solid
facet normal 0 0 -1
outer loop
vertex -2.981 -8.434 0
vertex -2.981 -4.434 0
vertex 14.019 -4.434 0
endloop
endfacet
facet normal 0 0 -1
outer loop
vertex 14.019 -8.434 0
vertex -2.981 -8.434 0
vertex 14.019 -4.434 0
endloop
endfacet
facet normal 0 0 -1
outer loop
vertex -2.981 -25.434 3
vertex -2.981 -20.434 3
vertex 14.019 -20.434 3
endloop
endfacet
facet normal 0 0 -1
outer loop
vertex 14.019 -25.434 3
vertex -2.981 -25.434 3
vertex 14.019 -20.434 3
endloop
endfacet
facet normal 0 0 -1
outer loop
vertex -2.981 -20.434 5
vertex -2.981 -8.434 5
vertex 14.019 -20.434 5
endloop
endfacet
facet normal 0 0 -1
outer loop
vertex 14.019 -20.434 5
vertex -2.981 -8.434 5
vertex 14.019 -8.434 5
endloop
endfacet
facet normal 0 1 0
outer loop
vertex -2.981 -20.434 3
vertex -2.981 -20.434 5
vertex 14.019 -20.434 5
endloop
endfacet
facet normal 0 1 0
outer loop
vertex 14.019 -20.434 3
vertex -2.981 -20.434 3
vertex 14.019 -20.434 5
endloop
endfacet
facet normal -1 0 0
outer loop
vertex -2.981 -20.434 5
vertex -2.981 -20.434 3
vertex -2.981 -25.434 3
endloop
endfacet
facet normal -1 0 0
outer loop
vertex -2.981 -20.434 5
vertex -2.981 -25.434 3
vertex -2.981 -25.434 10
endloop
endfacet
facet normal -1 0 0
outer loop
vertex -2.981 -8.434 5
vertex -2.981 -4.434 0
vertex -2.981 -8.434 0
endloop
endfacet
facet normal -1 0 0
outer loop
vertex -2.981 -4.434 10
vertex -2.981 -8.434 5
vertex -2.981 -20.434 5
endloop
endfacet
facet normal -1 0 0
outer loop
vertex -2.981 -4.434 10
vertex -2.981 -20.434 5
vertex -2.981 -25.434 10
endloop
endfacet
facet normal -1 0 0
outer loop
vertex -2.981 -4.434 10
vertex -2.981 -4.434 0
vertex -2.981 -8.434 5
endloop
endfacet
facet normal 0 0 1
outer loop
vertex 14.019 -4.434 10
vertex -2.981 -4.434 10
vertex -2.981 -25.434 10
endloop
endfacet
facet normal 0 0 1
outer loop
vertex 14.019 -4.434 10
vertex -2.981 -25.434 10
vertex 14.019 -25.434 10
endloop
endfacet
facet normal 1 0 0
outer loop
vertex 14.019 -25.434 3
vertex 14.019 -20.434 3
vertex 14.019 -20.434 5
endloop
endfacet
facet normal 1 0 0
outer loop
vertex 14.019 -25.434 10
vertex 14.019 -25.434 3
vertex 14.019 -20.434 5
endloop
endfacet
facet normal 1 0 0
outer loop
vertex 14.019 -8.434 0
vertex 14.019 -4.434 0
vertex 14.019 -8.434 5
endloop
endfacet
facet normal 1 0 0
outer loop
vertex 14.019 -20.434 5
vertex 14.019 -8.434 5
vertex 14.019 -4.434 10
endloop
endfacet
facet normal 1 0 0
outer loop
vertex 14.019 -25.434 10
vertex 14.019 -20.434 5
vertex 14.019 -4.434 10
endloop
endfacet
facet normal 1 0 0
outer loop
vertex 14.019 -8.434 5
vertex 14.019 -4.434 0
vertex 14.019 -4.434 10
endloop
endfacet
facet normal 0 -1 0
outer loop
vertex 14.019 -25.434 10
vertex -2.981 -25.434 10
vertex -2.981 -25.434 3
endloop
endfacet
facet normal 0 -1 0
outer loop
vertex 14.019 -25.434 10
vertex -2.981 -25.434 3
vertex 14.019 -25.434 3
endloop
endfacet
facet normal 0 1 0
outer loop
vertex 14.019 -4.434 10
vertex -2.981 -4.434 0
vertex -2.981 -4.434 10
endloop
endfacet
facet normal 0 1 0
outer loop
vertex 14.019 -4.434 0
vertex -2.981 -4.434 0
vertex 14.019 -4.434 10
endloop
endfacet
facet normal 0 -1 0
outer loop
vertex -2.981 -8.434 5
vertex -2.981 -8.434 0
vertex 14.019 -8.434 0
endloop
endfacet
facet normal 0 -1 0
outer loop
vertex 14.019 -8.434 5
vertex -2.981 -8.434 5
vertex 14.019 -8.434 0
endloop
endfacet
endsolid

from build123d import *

# Parameters (mm, degrees)
F0_W     = 17
F0_H     = 4
F1_DEPTH = 10
F2_W     = 17
F2_H     = 5
F3_DEPTH = 12
F4_W     = 17
F4_H     = 7
F5_DEPTH = 5


with BuildPart() as f1:
    # F0 (on Top) → F1 (new body)
    with BuildSketch(Plane.XY):
        with Locations((5.519233, -6.434065)):
            Rectangle(F0_W, F0_H)
    extrude(amount=F1_DEPTH)

    # F2 (on face) → F3 (join)
    with BuildSketch(Plane.XZ.offset(8.434065)):
        with Locations((5.519233, 7.5)):
            Rectangle(F2_W, F2_H)
    extrude(amount=F3_DEPTH)

    # F4 (on face) → F5 (join)
    with BuildSketch(Plane.XZ.offset(20.434065)):
        with Locations((5.519233, 6.5)):
            Rectangle(F4_W, F4_H)
    extrude(amount=F5_DEPTH)


solid = f1.part
